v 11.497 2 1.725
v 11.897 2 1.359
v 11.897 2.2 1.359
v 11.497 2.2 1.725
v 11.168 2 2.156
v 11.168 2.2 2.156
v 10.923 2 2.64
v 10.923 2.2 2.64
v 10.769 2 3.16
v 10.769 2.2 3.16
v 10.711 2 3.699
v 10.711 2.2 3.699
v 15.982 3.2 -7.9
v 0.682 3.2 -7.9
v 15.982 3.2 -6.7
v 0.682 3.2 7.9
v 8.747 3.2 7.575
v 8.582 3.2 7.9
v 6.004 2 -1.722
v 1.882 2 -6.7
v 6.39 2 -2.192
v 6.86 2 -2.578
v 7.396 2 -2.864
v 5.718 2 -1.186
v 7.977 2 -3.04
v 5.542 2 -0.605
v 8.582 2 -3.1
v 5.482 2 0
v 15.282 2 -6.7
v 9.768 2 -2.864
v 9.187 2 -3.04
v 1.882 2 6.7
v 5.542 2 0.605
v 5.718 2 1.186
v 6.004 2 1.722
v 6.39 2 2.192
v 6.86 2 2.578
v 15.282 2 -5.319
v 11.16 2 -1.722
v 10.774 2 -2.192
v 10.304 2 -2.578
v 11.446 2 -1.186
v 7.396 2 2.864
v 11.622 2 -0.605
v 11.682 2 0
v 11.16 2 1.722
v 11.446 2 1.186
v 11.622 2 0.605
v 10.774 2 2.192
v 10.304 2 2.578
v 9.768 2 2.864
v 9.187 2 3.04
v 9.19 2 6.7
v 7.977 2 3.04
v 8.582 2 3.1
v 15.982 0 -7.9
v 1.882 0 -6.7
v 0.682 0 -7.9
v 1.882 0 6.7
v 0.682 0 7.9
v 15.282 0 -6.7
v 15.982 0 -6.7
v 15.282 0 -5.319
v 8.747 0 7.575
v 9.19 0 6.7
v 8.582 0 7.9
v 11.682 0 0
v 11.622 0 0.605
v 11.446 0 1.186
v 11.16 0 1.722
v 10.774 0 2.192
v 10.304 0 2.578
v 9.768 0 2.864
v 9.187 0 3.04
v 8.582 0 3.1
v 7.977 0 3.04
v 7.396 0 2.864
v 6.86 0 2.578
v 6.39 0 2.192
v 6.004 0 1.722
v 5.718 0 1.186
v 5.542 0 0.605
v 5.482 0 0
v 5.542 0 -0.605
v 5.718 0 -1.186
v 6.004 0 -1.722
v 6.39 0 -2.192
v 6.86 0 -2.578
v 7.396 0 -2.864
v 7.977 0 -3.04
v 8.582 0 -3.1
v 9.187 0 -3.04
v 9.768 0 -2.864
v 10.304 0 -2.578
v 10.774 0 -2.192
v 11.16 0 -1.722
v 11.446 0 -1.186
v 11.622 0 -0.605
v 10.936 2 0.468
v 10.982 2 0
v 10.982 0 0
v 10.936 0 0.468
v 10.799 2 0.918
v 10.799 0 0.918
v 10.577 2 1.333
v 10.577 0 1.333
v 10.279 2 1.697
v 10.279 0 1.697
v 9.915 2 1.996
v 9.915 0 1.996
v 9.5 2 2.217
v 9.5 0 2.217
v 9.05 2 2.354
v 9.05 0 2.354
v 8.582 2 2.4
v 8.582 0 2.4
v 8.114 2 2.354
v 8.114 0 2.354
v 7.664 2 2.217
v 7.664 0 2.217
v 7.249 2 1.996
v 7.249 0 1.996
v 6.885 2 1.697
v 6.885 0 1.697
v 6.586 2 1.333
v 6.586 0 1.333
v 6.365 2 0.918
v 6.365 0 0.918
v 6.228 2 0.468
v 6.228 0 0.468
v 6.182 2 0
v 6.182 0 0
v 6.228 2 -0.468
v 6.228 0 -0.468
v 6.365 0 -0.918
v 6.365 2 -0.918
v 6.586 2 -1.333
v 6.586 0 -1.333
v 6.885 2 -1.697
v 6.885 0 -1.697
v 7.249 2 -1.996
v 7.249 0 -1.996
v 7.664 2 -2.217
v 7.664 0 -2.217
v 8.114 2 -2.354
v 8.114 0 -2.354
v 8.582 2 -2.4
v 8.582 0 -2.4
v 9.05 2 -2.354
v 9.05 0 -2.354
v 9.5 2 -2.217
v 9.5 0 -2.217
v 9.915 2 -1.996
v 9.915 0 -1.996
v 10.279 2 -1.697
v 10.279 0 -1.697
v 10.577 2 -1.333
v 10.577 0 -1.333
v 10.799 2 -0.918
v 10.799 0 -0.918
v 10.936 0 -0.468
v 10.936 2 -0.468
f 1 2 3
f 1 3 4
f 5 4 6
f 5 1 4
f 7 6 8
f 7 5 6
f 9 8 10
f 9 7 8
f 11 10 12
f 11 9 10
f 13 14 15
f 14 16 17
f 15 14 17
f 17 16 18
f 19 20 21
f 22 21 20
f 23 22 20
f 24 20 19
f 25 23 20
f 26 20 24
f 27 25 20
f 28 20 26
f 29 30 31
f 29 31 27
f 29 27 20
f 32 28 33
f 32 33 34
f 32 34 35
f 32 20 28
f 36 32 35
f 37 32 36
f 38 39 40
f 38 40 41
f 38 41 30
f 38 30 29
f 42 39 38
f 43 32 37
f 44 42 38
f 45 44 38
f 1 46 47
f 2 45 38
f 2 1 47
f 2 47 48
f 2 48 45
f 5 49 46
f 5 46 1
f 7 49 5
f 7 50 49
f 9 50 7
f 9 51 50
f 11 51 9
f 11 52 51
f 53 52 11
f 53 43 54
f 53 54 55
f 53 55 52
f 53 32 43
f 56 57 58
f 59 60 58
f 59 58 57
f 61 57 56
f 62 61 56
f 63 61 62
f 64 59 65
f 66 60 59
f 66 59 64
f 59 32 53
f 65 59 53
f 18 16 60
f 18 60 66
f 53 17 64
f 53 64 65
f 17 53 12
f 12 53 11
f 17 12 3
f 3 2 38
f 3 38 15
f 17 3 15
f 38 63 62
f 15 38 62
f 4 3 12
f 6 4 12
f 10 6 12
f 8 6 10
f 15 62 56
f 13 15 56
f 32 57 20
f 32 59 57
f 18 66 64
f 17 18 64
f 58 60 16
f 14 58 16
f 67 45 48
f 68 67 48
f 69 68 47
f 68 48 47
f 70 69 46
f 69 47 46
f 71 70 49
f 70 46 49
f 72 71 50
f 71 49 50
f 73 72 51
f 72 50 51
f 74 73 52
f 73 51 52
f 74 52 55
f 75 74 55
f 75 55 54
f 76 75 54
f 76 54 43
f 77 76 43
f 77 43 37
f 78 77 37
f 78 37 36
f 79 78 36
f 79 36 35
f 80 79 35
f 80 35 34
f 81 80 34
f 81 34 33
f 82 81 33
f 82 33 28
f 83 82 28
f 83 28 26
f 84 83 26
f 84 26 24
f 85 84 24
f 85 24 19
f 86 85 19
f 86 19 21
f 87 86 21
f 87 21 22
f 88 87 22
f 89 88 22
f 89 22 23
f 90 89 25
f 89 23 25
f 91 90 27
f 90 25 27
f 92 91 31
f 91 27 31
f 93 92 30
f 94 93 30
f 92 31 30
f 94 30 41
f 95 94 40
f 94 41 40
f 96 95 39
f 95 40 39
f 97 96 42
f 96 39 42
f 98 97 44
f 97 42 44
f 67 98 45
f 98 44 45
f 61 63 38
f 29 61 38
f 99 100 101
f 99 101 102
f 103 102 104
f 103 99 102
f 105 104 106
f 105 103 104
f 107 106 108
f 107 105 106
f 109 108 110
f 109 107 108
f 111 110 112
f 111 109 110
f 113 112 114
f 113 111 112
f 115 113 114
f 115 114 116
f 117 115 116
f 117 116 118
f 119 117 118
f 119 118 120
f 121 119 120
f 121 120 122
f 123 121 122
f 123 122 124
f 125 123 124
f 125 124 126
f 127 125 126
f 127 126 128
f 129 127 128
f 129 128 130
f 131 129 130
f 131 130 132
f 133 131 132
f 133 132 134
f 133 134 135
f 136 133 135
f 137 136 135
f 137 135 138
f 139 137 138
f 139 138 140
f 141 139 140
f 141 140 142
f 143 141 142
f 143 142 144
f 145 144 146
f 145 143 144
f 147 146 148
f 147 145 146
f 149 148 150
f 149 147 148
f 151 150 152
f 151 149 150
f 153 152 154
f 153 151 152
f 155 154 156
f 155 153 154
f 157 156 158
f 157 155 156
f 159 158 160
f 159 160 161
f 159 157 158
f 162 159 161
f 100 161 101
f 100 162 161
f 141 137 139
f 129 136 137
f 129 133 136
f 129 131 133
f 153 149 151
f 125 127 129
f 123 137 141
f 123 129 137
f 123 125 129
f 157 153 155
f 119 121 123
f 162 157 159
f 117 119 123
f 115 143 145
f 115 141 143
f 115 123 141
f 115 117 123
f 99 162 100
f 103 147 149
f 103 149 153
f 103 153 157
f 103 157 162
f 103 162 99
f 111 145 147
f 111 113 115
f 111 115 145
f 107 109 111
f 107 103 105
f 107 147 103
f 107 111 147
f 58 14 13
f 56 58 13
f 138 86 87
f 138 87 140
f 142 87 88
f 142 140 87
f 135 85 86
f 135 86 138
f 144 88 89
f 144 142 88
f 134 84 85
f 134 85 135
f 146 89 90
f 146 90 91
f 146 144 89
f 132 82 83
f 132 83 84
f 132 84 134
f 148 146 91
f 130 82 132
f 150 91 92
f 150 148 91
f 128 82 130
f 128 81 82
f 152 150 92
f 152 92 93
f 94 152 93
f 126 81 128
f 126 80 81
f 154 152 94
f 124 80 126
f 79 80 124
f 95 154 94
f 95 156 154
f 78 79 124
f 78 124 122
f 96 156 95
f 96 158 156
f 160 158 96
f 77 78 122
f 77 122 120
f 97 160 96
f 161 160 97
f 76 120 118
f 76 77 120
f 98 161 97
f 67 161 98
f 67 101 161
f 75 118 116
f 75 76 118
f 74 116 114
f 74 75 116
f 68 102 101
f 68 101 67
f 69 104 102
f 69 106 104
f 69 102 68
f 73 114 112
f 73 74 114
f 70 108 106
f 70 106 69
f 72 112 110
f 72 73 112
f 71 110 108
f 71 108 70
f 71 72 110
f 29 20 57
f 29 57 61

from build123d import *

# Parameters (mm, degrees)
MAINBASESKETCH_W          = 15.8
MAINBASESKETCH_H          = 3.2
MAINBASEEXTRUDE_DEPTH     = 7.9
MAINBASESHELL_T           = -1.2
UNDERSIDECIRCLEEXT_START  = -0.2
UNDERSIDECIRCLESKETCH_R   = 3.1
UNDERSIDECIRCLESKETCH_R_2 = 2.4
UNDERSIDECIRCLEEXT_DEPTH  = 2.2
ANGLEDCUT_DEPTH           = 19.555463972
CUT_EXTRUDE16_DEPTH       = 2.2


with BuildPart() as part:
    # MainBaseSketch → MainBaseExtrude (new, symmetric)
    with BuildSketch(Plane.XY):
        with Locations((8.581967213, 1.6)):
            Rectangle(MAINBASESKETCH_W, MAINBASESKETCH_H)
    extrude(amount=MAINBASEEXTRUDE_DEPTH, both=True)

    # MainBaseShell
    mainbaseshell_openings = [part.faces().sort_by_distance(p)[0] for p in [
        (8.581967213, 0, 0),
    ]]
    offset(amount=MAINBASESHELL_T, openings=mainbaseshell_openings, kind=Kind.INTERSECTION)

    # UnderSideCircleSketch → UnderSideCircleExt (add)
    with BuildSketch(Plane.XZ.offset(-2).offset(UNDERSIDECIRCLEEXT_START)):
        with Locations((8.581967213, 0)):
            Circle(UNDERSIDECIRCLESKETCH_R)
        with Locations((8.581967213, 0)):
            Circle(UNDERSIDECIRCLESKETCH_R_2, mode=Mode.SUBTRACT)
    extrude(amount=UNDERSIDECIRCLEEXT_DEPTH)

    # AngledCutSketch → AngledCut (cut, through all)
    with BuildSketch(Plane.XZ):
        Polygon((8.7465188, 7.575344166), (15.981967213, -6.7), (15.981967213, -7.9), (16.481967213, -7.9), (16.481967213, 7.9), (8.581967213, 7.9), align=None)
    extrude(amount=-ANGLEDCUT_DEPTH, mode=Mode.SUBTRACT)

    # AngledNotchSketch → Cut-Extrude16 (cut)
    with BuildSketch(Plane(origin=(0, 0, 0), x_dir=(-1, 0, 0), z_dir=(0, -1, 0))):
        with BuildLine():
            Line((-10.711153505, -3.699172992), (-11.897271127, -1.358994981))
            ThreePointArc((-11.897271127, -1.358994981), (-11.034832221, -2.39254887), (-10.711153505, -3.699172992))
        make_face()
    extrude(amount=-CUT_EXTRUDE16_DEPTH, mode=Mode.SUBTRACT)


solid = part.part
